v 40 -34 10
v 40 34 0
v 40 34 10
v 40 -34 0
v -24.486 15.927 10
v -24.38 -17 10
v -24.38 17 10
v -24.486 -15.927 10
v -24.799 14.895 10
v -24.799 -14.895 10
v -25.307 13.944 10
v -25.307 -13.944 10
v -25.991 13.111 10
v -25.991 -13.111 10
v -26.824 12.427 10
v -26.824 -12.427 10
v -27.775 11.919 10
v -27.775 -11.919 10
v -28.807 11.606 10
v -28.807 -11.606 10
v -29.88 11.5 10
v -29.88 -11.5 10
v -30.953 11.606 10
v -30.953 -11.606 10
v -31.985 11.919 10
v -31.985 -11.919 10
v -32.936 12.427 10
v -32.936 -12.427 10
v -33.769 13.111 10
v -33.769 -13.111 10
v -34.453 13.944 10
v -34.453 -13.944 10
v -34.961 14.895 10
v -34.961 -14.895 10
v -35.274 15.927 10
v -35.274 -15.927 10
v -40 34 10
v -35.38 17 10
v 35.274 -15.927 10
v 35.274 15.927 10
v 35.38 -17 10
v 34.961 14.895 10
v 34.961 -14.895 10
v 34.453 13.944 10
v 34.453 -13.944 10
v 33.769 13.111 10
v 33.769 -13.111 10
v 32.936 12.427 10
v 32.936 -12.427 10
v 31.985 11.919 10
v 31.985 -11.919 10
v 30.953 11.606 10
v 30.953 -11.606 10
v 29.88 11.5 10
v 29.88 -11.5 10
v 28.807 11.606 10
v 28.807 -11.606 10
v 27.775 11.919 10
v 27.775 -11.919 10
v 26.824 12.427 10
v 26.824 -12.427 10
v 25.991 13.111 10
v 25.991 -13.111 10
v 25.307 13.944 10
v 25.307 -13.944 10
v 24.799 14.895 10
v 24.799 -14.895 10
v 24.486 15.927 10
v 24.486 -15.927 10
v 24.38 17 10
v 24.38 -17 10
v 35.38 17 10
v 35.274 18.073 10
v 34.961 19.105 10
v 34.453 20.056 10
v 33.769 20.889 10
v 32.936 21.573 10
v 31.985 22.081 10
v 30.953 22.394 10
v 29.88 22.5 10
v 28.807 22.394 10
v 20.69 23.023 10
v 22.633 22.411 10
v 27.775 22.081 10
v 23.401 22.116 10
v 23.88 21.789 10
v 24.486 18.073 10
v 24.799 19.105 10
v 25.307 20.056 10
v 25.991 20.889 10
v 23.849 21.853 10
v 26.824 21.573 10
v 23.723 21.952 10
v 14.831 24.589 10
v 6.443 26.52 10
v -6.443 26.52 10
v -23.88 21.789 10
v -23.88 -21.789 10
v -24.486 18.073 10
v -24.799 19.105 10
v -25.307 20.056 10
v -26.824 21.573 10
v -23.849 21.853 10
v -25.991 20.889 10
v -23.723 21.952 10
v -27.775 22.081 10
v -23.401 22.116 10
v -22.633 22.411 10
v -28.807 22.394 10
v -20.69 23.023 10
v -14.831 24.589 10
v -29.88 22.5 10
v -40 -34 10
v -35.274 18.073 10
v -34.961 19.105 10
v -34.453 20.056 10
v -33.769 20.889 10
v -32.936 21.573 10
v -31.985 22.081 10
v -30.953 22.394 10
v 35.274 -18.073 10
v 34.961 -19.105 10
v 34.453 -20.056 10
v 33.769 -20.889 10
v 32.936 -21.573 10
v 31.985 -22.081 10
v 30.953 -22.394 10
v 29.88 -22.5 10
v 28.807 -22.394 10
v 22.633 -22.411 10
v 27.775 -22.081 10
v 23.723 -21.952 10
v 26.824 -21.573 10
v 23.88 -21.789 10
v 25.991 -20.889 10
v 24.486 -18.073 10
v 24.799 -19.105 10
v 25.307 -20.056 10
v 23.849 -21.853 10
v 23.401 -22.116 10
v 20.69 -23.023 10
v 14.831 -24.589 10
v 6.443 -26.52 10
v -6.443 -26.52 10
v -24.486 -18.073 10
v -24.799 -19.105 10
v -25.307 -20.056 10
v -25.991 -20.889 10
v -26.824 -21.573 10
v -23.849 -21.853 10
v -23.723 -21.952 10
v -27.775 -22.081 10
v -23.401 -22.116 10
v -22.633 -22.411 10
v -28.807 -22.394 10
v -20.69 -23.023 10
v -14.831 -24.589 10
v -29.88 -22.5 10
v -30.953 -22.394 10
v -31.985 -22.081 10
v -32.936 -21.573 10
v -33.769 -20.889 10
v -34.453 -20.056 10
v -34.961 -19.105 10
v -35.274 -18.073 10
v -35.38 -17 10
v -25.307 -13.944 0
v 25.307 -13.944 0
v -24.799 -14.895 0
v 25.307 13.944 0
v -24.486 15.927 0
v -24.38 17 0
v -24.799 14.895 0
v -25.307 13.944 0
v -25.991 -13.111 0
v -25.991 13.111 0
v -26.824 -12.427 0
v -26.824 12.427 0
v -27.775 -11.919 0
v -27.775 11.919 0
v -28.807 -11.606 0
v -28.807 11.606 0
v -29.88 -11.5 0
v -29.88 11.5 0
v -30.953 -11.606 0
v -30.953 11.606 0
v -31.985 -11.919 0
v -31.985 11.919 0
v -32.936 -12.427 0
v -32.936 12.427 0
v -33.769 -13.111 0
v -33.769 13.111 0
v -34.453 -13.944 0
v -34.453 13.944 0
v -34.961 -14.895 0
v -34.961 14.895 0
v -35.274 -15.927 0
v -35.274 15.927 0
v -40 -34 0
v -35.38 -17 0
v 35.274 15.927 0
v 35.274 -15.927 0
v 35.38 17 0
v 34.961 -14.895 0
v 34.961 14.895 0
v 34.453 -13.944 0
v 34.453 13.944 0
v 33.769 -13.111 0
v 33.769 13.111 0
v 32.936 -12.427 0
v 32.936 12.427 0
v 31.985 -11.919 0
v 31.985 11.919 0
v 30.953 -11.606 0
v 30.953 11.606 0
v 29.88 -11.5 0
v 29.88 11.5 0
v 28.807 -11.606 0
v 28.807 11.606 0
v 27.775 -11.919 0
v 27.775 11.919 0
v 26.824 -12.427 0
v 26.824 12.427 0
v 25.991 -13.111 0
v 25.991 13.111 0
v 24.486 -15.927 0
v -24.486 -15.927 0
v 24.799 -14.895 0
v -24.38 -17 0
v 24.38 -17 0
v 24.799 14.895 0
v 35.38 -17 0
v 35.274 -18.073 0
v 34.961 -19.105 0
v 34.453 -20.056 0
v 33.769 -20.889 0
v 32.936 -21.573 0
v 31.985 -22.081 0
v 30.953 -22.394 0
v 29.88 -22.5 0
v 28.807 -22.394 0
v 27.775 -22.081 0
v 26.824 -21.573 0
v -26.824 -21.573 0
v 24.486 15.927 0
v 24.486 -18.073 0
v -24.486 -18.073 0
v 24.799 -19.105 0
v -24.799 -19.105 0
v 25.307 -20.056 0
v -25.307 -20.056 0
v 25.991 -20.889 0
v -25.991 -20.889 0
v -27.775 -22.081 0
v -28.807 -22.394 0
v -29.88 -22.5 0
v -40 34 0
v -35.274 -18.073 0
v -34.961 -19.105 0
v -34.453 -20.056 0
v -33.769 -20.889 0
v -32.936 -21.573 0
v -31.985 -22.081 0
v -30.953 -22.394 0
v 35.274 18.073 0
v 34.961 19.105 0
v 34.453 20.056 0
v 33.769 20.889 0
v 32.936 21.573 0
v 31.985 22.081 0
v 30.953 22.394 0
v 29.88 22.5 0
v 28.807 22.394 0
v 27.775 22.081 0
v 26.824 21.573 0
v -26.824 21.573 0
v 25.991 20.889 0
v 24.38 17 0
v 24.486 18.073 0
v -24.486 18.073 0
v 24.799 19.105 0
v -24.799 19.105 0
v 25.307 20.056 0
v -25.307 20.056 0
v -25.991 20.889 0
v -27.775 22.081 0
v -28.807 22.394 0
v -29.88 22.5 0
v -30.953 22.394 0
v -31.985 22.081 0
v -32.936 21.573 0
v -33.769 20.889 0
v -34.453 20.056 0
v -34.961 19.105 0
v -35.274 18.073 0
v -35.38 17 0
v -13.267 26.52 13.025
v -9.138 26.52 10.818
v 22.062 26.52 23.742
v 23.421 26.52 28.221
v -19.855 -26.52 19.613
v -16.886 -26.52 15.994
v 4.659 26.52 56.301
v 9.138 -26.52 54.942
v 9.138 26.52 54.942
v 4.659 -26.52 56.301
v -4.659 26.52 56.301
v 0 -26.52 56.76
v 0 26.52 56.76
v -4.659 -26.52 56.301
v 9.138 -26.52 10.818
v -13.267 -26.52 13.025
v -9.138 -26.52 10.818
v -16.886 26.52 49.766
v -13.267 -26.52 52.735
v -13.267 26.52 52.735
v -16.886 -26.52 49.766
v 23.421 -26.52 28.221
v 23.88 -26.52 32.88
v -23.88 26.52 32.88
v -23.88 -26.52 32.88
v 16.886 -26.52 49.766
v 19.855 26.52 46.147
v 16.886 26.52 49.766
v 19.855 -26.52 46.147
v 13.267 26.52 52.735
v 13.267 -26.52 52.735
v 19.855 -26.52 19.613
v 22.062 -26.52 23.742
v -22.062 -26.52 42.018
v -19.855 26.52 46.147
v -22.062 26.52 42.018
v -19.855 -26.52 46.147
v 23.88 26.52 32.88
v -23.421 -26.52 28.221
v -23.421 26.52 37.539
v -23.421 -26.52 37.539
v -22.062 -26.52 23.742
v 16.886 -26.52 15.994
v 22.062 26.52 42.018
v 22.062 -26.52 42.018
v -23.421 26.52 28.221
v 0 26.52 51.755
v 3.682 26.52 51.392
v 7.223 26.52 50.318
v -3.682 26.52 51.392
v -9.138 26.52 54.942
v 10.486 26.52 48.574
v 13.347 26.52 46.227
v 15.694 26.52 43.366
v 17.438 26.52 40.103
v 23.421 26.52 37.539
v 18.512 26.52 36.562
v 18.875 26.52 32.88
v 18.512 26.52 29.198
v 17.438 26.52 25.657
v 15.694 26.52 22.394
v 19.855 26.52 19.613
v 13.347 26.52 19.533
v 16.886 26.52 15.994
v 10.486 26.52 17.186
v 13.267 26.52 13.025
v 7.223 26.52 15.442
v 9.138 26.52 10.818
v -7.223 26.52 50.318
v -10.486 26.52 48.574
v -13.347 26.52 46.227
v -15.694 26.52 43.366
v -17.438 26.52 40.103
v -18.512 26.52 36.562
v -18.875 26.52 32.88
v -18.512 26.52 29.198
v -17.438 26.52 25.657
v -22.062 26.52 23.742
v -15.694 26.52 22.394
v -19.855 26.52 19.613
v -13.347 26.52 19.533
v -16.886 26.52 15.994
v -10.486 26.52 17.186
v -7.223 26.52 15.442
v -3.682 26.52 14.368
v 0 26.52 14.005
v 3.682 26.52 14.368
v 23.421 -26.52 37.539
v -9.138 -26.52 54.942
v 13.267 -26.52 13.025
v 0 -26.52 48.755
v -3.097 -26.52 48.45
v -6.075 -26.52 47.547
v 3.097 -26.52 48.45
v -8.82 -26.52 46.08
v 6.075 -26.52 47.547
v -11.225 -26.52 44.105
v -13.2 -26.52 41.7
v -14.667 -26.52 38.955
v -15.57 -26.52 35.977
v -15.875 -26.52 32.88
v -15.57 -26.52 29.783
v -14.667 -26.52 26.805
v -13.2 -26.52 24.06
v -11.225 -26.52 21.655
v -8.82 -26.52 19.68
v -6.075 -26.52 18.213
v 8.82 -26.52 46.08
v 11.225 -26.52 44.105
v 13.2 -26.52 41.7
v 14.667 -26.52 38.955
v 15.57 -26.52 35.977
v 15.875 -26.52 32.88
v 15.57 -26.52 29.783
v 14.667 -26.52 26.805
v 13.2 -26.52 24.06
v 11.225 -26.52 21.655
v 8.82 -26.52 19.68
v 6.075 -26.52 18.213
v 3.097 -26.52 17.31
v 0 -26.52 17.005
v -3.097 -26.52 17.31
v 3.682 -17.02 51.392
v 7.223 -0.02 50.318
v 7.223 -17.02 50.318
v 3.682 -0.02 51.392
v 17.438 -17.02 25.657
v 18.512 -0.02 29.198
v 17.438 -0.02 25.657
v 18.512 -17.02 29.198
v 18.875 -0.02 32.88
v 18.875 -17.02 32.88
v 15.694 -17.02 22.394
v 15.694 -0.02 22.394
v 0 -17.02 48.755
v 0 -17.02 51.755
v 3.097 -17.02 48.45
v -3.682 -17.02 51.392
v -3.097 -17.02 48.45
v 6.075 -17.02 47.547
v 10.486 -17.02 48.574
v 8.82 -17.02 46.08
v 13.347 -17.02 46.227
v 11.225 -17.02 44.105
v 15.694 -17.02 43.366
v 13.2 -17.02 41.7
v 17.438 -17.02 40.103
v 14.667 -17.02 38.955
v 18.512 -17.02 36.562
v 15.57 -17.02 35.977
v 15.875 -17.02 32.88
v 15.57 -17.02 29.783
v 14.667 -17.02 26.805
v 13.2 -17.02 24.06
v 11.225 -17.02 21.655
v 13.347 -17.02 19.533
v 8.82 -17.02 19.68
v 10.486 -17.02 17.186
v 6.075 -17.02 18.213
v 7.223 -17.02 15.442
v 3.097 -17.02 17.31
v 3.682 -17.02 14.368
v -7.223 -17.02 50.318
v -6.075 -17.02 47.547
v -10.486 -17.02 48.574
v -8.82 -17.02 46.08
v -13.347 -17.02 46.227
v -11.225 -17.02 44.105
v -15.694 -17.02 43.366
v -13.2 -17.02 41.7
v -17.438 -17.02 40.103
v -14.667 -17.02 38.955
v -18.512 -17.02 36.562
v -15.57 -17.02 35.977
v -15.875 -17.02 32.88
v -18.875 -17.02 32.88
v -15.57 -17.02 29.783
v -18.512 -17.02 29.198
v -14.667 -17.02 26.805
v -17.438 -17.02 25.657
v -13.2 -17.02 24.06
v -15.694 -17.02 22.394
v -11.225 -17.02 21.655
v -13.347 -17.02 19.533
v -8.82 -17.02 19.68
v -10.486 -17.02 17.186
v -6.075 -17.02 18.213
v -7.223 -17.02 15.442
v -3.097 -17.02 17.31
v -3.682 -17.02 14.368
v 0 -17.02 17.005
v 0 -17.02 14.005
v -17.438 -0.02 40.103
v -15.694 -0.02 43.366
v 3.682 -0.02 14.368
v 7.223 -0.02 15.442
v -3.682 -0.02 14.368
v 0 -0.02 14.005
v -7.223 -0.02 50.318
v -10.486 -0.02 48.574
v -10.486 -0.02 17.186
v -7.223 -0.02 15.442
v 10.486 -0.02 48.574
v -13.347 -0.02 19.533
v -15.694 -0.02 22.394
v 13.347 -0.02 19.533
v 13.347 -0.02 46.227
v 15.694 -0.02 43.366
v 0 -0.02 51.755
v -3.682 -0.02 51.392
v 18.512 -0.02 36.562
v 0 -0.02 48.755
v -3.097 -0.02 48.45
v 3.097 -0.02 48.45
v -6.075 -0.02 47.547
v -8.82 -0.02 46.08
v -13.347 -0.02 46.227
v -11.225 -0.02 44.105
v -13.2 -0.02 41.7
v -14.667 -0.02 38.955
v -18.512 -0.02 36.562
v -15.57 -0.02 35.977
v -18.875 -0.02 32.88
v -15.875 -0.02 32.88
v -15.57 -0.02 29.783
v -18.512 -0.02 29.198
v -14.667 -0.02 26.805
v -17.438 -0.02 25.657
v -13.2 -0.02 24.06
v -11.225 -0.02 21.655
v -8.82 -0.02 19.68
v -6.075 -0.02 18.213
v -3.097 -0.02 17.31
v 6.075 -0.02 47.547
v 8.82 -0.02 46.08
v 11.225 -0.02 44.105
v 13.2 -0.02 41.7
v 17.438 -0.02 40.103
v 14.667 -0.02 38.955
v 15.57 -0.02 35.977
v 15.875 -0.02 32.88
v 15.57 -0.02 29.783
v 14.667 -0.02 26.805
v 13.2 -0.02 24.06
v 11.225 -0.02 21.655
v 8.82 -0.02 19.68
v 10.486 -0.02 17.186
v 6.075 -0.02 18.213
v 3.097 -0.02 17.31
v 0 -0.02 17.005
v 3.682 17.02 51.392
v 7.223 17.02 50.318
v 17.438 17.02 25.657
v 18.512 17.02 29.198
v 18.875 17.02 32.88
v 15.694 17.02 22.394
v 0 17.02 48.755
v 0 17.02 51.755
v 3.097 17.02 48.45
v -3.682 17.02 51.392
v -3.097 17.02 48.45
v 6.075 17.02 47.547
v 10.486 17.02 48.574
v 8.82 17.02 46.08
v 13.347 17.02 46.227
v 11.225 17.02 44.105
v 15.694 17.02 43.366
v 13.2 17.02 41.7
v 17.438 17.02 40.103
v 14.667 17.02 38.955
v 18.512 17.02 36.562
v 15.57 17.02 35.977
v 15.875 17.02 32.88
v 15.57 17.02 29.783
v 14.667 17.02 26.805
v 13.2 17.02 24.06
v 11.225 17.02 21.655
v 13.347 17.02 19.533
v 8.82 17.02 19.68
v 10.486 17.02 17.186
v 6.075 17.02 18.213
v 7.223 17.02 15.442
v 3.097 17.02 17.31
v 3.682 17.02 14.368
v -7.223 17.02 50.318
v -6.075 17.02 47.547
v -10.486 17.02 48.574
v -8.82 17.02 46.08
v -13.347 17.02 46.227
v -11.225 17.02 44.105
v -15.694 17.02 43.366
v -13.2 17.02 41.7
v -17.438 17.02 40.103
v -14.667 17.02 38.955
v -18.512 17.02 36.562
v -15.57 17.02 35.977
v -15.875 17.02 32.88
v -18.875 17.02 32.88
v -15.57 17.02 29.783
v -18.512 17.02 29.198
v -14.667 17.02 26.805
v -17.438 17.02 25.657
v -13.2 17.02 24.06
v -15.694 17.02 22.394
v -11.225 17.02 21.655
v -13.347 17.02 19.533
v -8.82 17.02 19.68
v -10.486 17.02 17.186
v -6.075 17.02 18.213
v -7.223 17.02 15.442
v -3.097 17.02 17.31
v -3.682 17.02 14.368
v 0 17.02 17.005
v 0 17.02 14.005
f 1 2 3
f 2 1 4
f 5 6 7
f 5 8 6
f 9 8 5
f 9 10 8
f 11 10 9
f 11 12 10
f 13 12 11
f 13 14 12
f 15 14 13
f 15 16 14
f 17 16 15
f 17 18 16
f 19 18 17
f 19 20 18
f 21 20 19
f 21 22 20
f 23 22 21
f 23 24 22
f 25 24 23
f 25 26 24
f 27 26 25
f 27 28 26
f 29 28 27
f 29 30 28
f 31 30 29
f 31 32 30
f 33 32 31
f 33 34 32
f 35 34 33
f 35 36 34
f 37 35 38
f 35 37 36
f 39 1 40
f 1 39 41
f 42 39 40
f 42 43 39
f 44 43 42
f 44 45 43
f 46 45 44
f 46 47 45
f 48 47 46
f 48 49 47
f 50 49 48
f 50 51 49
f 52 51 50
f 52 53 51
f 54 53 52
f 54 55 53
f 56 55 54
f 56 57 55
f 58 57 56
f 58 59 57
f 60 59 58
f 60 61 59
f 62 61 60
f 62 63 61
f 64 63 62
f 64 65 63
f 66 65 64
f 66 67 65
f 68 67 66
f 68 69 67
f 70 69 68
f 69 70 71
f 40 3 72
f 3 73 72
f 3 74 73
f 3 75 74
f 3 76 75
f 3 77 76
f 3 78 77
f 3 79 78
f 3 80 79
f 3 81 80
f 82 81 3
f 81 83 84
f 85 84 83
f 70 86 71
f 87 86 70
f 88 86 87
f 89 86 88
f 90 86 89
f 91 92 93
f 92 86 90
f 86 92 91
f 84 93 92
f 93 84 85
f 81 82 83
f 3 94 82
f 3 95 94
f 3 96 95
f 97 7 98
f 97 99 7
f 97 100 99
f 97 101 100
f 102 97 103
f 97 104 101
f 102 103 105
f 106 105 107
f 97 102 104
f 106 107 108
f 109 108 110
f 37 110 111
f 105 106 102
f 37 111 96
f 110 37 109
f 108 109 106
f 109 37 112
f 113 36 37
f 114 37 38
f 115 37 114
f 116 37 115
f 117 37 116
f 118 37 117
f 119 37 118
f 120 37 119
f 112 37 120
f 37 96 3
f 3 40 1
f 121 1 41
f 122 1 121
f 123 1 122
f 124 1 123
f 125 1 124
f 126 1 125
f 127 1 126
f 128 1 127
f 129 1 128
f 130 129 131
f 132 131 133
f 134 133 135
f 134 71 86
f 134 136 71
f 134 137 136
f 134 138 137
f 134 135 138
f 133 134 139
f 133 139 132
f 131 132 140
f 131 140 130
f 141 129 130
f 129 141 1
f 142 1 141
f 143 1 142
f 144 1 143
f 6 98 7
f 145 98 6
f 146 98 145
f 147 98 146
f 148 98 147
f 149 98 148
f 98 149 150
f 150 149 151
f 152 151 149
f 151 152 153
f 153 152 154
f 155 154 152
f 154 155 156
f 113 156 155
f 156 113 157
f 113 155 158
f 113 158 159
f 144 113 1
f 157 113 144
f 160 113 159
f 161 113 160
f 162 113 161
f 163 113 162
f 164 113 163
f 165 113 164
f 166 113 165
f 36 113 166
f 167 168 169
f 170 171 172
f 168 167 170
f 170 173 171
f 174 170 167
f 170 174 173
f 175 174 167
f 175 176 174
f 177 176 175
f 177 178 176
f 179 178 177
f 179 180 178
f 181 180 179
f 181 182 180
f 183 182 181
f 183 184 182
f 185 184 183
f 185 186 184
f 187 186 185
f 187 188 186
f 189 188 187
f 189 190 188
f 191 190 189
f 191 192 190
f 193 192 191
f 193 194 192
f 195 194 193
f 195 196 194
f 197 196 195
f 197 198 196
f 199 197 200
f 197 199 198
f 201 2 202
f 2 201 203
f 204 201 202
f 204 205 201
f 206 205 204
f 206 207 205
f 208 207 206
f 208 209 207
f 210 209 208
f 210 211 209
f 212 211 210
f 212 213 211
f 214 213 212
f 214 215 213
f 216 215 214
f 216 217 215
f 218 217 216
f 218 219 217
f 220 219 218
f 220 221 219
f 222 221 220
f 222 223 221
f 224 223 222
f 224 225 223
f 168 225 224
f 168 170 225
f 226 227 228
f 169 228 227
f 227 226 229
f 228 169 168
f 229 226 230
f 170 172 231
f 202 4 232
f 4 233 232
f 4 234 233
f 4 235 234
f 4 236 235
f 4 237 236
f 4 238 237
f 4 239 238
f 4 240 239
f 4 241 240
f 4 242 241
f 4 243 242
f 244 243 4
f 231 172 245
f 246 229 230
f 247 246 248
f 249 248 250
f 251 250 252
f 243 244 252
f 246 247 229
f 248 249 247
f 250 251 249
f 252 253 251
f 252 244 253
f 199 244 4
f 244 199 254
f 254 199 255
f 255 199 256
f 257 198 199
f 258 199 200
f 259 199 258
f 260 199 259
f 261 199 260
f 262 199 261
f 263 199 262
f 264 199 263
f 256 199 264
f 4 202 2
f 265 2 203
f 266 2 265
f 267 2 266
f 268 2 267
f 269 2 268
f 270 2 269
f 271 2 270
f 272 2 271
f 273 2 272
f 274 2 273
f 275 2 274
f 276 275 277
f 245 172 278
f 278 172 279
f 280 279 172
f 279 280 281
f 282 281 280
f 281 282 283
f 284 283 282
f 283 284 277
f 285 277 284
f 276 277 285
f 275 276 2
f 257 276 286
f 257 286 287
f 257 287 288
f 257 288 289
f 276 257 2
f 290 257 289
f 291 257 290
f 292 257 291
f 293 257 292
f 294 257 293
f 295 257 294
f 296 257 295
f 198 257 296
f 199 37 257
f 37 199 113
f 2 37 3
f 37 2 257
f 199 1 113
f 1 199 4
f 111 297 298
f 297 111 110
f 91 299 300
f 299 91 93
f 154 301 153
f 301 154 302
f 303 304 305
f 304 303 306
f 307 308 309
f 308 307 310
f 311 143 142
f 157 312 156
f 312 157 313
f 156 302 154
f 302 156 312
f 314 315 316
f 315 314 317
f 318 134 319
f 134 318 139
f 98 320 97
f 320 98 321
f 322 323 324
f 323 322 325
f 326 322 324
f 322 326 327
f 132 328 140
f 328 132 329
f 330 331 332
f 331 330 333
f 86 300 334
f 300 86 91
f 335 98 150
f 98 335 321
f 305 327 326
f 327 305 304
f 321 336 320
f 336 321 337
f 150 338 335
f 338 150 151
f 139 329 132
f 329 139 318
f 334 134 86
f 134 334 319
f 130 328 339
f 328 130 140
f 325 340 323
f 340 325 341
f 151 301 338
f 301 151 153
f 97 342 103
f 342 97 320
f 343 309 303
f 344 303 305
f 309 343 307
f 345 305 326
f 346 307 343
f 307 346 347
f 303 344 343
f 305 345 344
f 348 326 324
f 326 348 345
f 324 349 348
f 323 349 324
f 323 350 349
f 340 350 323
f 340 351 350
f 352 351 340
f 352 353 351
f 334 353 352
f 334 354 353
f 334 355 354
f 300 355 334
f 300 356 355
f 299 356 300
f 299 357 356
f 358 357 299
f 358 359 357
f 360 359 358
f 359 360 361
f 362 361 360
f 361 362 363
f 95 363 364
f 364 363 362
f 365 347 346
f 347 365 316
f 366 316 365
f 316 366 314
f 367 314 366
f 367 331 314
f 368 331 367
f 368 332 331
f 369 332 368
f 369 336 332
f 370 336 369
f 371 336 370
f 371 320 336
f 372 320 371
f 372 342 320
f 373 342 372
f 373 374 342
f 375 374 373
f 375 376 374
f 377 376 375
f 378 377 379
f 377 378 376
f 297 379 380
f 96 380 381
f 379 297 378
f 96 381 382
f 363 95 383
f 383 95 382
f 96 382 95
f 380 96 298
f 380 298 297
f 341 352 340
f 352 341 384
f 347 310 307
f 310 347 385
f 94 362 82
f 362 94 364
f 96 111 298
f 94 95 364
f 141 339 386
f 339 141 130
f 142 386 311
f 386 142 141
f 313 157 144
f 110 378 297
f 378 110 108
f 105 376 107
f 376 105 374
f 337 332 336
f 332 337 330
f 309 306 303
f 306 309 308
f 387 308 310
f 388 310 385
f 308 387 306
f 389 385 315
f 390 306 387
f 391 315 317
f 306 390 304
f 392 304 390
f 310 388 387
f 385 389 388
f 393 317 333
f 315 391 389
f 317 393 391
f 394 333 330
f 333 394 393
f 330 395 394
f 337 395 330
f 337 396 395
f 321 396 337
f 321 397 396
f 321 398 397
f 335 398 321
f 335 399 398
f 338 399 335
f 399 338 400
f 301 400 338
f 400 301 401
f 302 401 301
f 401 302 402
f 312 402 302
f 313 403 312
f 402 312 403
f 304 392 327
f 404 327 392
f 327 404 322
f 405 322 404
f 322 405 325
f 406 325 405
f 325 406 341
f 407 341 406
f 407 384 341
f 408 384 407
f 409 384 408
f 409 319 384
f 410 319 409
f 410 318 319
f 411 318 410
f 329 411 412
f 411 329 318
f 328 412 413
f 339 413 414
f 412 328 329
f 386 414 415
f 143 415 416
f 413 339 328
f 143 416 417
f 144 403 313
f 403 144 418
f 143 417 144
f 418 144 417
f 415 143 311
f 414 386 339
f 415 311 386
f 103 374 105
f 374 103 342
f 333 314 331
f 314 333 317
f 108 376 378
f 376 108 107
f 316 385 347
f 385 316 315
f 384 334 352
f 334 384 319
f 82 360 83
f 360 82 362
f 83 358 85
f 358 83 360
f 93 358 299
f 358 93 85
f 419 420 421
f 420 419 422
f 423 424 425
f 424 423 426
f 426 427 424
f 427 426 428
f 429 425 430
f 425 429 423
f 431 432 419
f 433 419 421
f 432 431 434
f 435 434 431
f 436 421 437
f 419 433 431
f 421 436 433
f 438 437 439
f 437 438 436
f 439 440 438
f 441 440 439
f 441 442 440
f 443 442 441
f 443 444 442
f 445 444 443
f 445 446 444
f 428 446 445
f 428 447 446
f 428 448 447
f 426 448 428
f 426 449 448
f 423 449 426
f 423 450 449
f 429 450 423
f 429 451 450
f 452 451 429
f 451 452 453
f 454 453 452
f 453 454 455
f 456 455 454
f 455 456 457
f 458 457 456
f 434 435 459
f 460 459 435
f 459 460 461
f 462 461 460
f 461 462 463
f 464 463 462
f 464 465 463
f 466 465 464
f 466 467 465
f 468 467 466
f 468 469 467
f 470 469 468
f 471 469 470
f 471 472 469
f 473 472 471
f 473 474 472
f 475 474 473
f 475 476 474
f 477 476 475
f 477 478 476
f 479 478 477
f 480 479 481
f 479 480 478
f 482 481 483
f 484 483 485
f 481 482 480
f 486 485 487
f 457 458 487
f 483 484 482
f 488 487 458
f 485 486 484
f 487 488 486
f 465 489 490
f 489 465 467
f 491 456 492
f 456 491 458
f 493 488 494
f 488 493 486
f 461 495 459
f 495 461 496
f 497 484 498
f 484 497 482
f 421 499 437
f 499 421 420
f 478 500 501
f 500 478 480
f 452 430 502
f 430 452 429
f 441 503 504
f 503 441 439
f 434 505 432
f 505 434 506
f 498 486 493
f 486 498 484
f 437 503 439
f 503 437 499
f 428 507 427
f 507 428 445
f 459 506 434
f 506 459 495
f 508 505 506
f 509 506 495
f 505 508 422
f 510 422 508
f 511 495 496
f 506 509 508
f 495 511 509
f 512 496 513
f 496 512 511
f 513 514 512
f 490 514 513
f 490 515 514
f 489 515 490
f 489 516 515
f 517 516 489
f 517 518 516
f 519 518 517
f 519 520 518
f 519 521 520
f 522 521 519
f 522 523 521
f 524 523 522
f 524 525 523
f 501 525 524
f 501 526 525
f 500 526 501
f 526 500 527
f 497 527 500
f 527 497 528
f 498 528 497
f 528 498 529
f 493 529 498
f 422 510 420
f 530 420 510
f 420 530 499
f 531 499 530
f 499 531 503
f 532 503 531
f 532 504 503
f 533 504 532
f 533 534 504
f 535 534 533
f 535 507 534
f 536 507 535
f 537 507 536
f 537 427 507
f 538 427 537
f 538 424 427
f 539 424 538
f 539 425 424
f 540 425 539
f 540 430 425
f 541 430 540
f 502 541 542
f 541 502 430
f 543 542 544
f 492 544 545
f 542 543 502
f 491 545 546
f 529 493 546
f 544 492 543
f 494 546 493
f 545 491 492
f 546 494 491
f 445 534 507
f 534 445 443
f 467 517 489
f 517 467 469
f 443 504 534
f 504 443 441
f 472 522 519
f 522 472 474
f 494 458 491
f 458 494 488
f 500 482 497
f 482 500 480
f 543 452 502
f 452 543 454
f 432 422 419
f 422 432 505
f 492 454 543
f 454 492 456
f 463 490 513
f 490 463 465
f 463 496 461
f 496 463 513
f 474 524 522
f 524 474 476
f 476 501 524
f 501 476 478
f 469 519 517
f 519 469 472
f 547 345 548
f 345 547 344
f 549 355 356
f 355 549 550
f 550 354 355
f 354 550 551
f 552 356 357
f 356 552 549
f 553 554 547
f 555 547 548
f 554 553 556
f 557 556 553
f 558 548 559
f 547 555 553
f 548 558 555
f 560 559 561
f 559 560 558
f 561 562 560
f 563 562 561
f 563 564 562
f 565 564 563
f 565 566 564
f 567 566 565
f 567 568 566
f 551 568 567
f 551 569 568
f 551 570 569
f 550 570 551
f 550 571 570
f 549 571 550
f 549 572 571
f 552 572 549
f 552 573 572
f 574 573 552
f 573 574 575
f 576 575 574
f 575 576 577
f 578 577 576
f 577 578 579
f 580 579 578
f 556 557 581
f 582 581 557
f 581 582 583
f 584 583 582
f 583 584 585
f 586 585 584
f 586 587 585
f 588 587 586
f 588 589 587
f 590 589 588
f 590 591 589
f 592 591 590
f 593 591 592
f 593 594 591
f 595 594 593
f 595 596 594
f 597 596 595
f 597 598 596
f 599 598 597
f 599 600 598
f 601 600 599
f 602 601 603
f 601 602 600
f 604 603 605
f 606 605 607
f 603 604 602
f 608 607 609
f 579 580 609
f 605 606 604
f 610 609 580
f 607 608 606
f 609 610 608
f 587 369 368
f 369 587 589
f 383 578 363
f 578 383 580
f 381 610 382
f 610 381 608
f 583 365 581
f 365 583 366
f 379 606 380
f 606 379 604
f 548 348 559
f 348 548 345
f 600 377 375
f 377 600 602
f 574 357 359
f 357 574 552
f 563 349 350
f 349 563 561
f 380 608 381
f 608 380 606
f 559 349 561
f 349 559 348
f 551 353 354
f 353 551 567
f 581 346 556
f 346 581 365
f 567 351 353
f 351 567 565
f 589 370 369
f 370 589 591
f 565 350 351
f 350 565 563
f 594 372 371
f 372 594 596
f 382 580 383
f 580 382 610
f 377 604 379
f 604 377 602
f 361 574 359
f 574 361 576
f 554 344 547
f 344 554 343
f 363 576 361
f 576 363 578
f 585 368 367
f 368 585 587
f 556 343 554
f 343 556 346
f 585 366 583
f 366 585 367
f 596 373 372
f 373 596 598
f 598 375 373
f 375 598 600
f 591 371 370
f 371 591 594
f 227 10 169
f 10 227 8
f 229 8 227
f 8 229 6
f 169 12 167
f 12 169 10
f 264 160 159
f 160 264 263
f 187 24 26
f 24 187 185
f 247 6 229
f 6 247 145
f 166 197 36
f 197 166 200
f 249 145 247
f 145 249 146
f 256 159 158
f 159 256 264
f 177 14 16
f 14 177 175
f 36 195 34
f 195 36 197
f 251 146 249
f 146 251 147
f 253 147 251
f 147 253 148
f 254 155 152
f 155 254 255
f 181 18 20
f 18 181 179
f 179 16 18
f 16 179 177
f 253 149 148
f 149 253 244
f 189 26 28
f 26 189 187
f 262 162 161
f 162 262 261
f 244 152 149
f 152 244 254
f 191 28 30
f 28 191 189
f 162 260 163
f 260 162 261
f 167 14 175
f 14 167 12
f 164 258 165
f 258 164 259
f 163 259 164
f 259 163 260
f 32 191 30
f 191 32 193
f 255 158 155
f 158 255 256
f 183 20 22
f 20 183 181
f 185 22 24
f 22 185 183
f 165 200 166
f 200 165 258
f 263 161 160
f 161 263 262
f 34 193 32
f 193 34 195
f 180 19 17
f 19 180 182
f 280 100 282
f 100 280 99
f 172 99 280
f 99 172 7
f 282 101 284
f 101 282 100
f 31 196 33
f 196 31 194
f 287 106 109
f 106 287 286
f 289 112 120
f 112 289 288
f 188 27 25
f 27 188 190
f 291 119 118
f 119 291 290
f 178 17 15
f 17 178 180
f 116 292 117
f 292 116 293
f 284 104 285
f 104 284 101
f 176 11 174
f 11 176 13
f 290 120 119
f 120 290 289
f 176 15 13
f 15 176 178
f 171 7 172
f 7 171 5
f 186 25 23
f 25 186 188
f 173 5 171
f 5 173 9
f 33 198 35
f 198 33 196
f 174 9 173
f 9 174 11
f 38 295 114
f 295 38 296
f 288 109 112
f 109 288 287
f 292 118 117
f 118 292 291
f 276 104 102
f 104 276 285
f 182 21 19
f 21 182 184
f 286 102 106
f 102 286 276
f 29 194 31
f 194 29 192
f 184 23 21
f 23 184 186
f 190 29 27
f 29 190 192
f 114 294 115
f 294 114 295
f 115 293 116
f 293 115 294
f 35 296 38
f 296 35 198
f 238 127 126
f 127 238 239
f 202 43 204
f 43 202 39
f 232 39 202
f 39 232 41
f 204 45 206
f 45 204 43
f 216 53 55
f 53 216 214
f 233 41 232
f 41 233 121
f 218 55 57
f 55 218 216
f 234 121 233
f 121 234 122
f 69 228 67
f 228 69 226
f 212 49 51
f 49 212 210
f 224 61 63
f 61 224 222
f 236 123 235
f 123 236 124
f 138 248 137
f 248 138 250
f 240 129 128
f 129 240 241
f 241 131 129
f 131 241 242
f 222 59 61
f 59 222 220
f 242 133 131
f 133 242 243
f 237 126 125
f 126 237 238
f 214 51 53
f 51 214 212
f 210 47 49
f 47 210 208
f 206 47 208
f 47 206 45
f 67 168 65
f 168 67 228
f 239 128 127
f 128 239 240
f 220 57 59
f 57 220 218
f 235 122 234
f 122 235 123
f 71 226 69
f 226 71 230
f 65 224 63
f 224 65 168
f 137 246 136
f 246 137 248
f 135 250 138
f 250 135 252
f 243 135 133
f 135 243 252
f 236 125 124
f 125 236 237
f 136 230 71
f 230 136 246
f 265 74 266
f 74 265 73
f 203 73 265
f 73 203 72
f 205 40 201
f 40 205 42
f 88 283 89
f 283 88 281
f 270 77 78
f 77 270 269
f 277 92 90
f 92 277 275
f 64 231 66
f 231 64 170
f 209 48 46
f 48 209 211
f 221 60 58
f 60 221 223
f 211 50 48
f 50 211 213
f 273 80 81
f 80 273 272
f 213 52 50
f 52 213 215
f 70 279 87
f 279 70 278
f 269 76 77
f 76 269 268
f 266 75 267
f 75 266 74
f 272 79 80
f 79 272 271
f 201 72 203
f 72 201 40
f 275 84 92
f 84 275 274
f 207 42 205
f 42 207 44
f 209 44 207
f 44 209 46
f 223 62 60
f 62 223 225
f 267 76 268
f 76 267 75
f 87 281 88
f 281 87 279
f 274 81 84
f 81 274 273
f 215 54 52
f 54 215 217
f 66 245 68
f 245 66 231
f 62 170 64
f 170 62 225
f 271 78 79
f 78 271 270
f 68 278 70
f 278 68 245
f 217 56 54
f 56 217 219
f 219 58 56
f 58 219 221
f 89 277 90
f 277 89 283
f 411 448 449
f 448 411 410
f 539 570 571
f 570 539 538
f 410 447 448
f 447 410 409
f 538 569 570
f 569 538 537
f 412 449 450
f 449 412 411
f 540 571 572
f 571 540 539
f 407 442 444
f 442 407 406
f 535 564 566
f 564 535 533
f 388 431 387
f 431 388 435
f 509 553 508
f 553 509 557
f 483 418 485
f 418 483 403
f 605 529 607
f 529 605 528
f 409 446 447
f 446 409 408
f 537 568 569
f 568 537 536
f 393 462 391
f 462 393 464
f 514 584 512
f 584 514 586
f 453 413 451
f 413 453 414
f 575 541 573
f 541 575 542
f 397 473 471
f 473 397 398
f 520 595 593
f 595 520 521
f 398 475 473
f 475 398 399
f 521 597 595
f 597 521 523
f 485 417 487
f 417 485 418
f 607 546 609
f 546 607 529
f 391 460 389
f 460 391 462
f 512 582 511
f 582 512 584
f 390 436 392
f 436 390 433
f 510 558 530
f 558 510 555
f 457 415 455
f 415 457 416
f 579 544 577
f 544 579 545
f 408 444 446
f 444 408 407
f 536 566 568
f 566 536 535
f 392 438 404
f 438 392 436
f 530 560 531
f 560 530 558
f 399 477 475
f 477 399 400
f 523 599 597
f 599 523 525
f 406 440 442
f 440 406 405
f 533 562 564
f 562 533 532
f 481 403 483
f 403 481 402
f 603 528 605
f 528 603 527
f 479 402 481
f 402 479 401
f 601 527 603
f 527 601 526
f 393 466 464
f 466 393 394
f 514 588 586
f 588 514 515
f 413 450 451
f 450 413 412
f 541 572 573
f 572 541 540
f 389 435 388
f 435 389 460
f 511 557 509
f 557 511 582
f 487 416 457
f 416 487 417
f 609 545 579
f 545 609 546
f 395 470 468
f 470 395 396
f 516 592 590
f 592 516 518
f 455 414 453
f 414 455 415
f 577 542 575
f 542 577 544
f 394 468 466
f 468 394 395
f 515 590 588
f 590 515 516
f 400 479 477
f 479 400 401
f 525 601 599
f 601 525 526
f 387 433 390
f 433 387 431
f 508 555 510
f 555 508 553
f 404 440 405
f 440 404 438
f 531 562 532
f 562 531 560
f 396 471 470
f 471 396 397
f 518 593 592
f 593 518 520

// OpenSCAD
$fn = 32;

// ----------------------------------------------------------------------
// Bearing block: 80 x 68 mm base, 31.75 mm bore at 32.88 mm
// ----------------------------------------------------------------------

// --- parameters (mm) ---
base_w = 80;              // base width
base_d = 68;              // base depth
base_t = 10;              // base thickness
bore_d = 31.75;           // shaft / bearing bore
house_r = 23.88;          // housing outer radius
house_len = 53.04;        // housing length along the shaft
foot_w = 47.76;           // foot width under the housing
foot_len = 43.04;         // foot length along the shaft
axis_z = 32.88;           // bore axis height above the base
holes_d = 11;             // mounting holes
hole_x = 29.88;           // mounting hole spacing
seat_d = 12;              // bearing seat depth
seat_wall = 3;            // seat wall thickness

difference() {
  union() {
    /* base plate with its underside on z = 0 */
    translate([0, 0, base_t / 2]) cube([base_w, base_d, base_t], center = true);
    /* hull foot: a straight web blending into the round housing */
    hull() {
      translate([0, 0, base_t - 0.5]) cube([foot_w, foot_len, 1.6], center = true);
      translate([0, 0, axis_z]) rotate([-90, 0, 0]) cylinder(h = house_len, d = 2 * house_r, center = true);
    }
  }
  /* bore through the housing, 2.5 mm clear on both sides */
  translate([0, 0, axis_z]) rotate([-90, 0, 0]) cylinder(h = house_len + 5, d = bore_d, center = true);
  /* bearing seats, recessed into both ends of the housing */
  for (sy = [-1, 1]) {
    translate([0, sy * (house_len / 2 - seat_d + 2.5), axis_z]) rotate([-90, 0, 0]) cylinder(h = seat_d + 5, d = bore_d + 2 * seat_wall);
  }
  /* mounting holes through the base plate */
  for (hx = [-29.88, 29.88]) {
    for (hy = [-17, 17]) {
      translate([hx, hy, -2.5]) cylinder(h = base_t + 5, d = holes_d);
    }
  }
}
